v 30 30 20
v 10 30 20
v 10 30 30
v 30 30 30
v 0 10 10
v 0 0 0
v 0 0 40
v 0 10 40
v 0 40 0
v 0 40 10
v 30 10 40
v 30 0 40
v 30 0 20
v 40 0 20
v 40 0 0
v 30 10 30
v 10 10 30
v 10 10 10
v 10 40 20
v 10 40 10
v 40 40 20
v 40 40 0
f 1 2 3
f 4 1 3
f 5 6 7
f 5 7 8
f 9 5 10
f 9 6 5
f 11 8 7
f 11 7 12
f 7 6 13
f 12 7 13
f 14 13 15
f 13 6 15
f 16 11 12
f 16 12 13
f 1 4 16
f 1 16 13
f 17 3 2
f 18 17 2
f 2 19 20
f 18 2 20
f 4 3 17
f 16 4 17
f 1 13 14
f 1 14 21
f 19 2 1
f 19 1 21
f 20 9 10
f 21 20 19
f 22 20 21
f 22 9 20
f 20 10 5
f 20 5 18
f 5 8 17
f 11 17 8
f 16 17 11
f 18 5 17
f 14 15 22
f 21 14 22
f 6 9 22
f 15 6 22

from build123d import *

# Parameters (mm, degrees)
SKETCH1_W           = 40
SKETCH1_H           = 40
BOSS_EXTRUDE1_DEPTH = 40
SKETCH2_W           = 10
SKETCH2_H           = 20
CUT_EXTRUDE1_DEPTH  = 40
SKETCH3_W           = 10
SKETCH3_H           = 10
CUT_EXTRUDE2_DEPTH  = 40
SKETCH4_W           = 10
SKETCH4_H           = 10
CUT_EXTRUDE4_DEPTH  = 20
SKETCH5_W           = 10
SKETCH5_H           = 10
CUT_EXTRUDE5_DEPTH  = 30


with BuildPart() as part:
    # Sketch1 → Boss-Extrude1 (new body)
    with BuildSketch(Plane.XY):
        with Locations((20, 20)):
            Rectangle(SKETCH1_W, SKETCH1_H)
    extrude(amount=BOSS_EXTRUDE1_DEPTH)

    # Sketch2 → Cut-Extrude1 (cut)
    with BuildSketch(Plane(origin=(0, 40, 0), x_dir=(1, 0, 0), z_dir=(0, 1, 0))):
        with Locations((35, -30)):
            Rectangle(SKETCH2_W, SKETCH2_H)
    extrude(amount=-CUT_EXTRUDE1_DEPTH, mode=Mode.SUBTRACT)

    # Sketch3 → Cut-Extrude2 (cut)
    with BuildSketch(Plane.ZY):
        with Locations((25, 35)):
            Rectangle(SKETCH3_W, SKETCH3_H)
        Polygon((40, 10), (40, 40), (30, 40), (30, 30), (30, 10), align=None)
    extrude(amount=-CUT_EXTRUDE2_DEPTH, mode=Mode.SUBTRACT)

    # Sketch4 → Cut-Extrude4 (cut)
    with BuildSketch(Plane(origin=(0, 30, 0), x_dir=(1, 0, 0), z_dir=(0, 1, 0))):
        with Locations((5, -25)):
            Rectangle(SKETCH4_W, SKETCH4_H)
    extrude(amount=-CUT_EXTRUDE4_DEPTH, mode=Mode.SUBTRACT)

    # Sketch5 → Cut-Extrude5 (cut)
    with BuildSketch(Plane(origin=(0, 40, 0), x_dir=(1, 0, 0), z_dir=(0, 1, 0))):
        with Locations((5, -15)):
            Rectangle(SKETCH5_W, SKETCH5_H)
    extrude(amount=-CUT_EXTRUDE5_DEPTH, mode=Mode.SUBTRACT)


solid = part.part
